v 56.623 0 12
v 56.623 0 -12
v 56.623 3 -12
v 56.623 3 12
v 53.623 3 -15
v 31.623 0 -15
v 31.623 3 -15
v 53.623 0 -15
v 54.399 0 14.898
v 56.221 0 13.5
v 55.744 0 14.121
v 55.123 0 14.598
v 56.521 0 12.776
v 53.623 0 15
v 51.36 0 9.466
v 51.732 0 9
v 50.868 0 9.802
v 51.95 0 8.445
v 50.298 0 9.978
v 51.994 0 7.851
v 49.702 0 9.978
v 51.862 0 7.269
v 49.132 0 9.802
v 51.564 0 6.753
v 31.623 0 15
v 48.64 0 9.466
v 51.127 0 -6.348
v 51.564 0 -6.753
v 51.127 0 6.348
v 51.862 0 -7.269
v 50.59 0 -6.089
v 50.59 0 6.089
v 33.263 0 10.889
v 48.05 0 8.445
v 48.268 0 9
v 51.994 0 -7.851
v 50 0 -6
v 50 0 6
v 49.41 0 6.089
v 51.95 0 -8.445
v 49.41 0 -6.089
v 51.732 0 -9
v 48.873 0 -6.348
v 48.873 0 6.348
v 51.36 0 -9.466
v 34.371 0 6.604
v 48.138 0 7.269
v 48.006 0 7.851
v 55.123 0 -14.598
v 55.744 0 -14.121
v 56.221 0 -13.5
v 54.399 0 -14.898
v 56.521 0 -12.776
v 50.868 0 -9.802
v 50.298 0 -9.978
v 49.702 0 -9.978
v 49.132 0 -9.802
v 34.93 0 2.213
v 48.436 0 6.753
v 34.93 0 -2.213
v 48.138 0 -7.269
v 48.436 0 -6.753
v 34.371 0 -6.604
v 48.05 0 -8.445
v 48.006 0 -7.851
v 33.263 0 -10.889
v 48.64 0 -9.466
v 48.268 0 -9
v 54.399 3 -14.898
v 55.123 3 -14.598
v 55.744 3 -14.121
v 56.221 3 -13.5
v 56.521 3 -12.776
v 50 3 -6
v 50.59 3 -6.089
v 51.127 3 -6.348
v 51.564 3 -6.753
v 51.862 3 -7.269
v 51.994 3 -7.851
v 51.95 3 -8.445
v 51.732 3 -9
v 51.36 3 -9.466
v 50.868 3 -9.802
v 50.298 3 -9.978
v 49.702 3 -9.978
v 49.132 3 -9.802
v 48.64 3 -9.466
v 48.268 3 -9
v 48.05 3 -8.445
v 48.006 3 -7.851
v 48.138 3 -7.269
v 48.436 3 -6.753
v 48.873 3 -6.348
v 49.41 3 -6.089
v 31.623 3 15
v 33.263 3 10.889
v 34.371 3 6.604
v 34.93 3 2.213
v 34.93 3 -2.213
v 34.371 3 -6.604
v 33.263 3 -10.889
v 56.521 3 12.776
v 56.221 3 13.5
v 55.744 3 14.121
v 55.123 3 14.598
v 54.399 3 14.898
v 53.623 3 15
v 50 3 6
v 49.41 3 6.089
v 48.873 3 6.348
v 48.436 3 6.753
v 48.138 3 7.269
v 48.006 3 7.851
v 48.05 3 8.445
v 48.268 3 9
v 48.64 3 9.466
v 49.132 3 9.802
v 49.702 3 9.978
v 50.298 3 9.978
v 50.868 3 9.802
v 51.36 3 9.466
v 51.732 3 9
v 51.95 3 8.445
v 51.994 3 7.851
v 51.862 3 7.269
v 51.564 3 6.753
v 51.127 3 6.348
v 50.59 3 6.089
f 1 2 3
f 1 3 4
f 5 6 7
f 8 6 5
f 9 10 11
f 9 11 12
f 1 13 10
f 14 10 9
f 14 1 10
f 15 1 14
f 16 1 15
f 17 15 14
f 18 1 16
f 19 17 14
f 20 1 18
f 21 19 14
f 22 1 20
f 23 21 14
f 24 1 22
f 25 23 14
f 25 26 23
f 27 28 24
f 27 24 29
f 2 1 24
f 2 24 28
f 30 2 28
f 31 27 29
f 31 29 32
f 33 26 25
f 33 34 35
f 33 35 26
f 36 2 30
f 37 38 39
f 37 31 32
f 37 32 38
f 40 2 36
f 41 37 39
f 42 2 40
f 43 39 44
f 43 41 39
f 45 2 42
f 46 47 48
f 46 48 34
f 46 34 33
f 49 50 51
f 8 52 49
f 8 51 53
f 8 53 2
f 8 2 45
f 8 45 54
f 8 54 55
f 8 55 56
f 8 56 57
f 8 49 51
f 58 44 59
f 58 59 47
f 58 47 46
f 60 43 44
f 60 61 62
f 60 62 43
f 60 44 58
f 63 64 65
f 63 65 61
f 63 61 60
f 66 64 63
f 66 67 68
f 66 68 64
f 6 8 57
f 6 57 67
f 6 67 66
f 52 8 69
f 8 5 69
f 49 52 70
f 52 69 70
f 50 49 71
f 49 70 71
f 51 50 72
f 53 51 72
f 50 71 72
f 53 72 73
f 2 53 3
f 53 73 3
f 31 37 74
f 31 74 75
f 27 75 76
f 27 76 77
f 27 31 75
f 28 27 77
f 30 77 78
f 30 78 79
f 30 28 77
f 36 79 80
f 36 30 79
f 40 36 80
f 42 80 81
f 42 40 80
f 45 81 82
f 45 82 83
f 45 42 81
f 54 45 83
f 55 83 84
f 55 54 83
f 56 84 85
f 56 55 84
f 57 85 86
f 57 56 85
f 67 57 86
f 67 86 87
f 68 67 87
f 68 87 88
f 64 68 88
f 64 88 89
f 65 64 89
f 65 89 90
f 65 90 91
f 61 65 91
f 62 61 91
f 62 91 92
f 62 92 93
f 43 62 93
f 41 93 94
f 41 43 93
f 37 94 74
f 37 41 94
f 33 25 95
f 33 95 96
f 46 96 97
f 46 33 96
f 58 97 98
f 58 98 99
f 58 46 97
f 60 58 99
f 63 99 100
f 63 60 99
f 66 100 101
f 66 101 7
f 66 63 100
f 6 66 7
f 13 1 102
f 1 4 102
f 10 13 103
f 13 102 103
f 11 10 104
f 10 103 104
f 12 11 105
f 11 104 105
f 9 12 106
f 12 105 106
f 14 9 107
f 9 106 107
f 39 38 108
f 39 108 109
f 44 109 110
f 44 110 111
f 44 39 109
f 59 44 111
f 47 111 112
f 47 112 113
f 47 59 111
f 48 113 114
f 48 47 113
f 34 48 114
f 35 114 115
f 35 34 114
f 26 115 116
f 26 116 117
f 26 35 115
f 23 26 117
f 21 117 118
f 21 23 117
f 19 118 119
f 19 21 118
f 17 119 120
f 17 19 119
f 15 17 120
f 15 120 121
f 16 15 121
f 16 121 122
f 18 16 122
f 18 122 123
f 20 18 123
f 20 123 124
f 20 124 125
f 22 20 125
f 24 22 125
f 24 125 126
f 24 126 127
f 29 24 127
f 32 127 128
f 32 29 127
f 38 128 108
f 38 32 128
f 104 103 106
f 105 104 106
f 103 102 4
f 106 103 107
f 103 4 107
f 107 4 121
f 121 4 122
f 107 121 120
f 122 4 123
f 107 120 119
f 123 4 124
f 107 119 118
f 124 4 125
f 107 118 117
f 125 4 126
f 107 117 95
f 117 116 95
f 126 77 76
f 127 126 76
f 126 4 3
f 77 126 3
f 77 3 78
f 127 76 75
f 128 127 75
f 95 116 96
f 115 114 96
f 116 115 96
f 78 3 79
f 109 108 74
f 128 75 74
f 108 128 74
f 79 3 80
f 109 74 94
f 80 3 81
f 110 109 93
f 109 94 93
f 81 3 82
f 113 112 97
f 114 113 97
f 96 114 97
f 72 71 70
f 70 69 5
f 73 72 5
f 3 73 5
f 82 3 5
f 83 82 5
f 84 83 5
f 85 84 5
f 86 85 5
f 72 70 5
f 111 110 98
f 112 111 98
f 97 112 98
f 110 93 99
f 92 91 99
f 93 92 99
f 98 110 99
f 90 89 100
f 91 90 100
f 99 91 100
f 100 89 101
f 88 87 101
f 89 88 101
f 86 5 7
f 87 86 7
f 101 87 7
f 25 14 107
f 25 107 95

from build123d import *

# Parameters (mm, degrees)
SKETCH_1_R      = 2
EXTRUDE_1_DEPTH = 3
FILLET_1_R      = 3


with BuildPart() as part:
    # 草图1 → 凸台-拉伸1 (new body)
    with BuildSketch(Plane(origin=(0, 0, 0), x_dir=(1, 0, 0), z_dir=(0, 1, 0))):
        with BuildLine():
            Line((31.622776602, 15), (56.622776602, 15))
            Line((56.622776602, 15), (56.622776602, -15))
            Line((56.622776602, -15), (31.622776602, -15))
            ThreePointArc((31.622776602, -15), (35, 0), (31.622776602, 15))
        make_face()
        with Locations(Location((50, 8, 0), (0, 0, 270))):
            Circle(SKETCH_1_R, mode=Mode.SUBTRACT)
        with Locations(Location((50, -8, 0), (0, 0, 90))):
            Circle(SKETCH_1_R, mode=Mode.SUBTRACT)
    extrude(amount=EXTRUDE_1_DEPTH)

    # 圆角1
    fillet_1_edges = [part.edges().sort_by_distance(p)[0] for p in [
        (56.622776602, 1.5, -15),
        (56.622776602, 1.5, 15),
    ]]
    fillet(fillet_1_edges, radius=FILLET_1_R)


solid = part.part
